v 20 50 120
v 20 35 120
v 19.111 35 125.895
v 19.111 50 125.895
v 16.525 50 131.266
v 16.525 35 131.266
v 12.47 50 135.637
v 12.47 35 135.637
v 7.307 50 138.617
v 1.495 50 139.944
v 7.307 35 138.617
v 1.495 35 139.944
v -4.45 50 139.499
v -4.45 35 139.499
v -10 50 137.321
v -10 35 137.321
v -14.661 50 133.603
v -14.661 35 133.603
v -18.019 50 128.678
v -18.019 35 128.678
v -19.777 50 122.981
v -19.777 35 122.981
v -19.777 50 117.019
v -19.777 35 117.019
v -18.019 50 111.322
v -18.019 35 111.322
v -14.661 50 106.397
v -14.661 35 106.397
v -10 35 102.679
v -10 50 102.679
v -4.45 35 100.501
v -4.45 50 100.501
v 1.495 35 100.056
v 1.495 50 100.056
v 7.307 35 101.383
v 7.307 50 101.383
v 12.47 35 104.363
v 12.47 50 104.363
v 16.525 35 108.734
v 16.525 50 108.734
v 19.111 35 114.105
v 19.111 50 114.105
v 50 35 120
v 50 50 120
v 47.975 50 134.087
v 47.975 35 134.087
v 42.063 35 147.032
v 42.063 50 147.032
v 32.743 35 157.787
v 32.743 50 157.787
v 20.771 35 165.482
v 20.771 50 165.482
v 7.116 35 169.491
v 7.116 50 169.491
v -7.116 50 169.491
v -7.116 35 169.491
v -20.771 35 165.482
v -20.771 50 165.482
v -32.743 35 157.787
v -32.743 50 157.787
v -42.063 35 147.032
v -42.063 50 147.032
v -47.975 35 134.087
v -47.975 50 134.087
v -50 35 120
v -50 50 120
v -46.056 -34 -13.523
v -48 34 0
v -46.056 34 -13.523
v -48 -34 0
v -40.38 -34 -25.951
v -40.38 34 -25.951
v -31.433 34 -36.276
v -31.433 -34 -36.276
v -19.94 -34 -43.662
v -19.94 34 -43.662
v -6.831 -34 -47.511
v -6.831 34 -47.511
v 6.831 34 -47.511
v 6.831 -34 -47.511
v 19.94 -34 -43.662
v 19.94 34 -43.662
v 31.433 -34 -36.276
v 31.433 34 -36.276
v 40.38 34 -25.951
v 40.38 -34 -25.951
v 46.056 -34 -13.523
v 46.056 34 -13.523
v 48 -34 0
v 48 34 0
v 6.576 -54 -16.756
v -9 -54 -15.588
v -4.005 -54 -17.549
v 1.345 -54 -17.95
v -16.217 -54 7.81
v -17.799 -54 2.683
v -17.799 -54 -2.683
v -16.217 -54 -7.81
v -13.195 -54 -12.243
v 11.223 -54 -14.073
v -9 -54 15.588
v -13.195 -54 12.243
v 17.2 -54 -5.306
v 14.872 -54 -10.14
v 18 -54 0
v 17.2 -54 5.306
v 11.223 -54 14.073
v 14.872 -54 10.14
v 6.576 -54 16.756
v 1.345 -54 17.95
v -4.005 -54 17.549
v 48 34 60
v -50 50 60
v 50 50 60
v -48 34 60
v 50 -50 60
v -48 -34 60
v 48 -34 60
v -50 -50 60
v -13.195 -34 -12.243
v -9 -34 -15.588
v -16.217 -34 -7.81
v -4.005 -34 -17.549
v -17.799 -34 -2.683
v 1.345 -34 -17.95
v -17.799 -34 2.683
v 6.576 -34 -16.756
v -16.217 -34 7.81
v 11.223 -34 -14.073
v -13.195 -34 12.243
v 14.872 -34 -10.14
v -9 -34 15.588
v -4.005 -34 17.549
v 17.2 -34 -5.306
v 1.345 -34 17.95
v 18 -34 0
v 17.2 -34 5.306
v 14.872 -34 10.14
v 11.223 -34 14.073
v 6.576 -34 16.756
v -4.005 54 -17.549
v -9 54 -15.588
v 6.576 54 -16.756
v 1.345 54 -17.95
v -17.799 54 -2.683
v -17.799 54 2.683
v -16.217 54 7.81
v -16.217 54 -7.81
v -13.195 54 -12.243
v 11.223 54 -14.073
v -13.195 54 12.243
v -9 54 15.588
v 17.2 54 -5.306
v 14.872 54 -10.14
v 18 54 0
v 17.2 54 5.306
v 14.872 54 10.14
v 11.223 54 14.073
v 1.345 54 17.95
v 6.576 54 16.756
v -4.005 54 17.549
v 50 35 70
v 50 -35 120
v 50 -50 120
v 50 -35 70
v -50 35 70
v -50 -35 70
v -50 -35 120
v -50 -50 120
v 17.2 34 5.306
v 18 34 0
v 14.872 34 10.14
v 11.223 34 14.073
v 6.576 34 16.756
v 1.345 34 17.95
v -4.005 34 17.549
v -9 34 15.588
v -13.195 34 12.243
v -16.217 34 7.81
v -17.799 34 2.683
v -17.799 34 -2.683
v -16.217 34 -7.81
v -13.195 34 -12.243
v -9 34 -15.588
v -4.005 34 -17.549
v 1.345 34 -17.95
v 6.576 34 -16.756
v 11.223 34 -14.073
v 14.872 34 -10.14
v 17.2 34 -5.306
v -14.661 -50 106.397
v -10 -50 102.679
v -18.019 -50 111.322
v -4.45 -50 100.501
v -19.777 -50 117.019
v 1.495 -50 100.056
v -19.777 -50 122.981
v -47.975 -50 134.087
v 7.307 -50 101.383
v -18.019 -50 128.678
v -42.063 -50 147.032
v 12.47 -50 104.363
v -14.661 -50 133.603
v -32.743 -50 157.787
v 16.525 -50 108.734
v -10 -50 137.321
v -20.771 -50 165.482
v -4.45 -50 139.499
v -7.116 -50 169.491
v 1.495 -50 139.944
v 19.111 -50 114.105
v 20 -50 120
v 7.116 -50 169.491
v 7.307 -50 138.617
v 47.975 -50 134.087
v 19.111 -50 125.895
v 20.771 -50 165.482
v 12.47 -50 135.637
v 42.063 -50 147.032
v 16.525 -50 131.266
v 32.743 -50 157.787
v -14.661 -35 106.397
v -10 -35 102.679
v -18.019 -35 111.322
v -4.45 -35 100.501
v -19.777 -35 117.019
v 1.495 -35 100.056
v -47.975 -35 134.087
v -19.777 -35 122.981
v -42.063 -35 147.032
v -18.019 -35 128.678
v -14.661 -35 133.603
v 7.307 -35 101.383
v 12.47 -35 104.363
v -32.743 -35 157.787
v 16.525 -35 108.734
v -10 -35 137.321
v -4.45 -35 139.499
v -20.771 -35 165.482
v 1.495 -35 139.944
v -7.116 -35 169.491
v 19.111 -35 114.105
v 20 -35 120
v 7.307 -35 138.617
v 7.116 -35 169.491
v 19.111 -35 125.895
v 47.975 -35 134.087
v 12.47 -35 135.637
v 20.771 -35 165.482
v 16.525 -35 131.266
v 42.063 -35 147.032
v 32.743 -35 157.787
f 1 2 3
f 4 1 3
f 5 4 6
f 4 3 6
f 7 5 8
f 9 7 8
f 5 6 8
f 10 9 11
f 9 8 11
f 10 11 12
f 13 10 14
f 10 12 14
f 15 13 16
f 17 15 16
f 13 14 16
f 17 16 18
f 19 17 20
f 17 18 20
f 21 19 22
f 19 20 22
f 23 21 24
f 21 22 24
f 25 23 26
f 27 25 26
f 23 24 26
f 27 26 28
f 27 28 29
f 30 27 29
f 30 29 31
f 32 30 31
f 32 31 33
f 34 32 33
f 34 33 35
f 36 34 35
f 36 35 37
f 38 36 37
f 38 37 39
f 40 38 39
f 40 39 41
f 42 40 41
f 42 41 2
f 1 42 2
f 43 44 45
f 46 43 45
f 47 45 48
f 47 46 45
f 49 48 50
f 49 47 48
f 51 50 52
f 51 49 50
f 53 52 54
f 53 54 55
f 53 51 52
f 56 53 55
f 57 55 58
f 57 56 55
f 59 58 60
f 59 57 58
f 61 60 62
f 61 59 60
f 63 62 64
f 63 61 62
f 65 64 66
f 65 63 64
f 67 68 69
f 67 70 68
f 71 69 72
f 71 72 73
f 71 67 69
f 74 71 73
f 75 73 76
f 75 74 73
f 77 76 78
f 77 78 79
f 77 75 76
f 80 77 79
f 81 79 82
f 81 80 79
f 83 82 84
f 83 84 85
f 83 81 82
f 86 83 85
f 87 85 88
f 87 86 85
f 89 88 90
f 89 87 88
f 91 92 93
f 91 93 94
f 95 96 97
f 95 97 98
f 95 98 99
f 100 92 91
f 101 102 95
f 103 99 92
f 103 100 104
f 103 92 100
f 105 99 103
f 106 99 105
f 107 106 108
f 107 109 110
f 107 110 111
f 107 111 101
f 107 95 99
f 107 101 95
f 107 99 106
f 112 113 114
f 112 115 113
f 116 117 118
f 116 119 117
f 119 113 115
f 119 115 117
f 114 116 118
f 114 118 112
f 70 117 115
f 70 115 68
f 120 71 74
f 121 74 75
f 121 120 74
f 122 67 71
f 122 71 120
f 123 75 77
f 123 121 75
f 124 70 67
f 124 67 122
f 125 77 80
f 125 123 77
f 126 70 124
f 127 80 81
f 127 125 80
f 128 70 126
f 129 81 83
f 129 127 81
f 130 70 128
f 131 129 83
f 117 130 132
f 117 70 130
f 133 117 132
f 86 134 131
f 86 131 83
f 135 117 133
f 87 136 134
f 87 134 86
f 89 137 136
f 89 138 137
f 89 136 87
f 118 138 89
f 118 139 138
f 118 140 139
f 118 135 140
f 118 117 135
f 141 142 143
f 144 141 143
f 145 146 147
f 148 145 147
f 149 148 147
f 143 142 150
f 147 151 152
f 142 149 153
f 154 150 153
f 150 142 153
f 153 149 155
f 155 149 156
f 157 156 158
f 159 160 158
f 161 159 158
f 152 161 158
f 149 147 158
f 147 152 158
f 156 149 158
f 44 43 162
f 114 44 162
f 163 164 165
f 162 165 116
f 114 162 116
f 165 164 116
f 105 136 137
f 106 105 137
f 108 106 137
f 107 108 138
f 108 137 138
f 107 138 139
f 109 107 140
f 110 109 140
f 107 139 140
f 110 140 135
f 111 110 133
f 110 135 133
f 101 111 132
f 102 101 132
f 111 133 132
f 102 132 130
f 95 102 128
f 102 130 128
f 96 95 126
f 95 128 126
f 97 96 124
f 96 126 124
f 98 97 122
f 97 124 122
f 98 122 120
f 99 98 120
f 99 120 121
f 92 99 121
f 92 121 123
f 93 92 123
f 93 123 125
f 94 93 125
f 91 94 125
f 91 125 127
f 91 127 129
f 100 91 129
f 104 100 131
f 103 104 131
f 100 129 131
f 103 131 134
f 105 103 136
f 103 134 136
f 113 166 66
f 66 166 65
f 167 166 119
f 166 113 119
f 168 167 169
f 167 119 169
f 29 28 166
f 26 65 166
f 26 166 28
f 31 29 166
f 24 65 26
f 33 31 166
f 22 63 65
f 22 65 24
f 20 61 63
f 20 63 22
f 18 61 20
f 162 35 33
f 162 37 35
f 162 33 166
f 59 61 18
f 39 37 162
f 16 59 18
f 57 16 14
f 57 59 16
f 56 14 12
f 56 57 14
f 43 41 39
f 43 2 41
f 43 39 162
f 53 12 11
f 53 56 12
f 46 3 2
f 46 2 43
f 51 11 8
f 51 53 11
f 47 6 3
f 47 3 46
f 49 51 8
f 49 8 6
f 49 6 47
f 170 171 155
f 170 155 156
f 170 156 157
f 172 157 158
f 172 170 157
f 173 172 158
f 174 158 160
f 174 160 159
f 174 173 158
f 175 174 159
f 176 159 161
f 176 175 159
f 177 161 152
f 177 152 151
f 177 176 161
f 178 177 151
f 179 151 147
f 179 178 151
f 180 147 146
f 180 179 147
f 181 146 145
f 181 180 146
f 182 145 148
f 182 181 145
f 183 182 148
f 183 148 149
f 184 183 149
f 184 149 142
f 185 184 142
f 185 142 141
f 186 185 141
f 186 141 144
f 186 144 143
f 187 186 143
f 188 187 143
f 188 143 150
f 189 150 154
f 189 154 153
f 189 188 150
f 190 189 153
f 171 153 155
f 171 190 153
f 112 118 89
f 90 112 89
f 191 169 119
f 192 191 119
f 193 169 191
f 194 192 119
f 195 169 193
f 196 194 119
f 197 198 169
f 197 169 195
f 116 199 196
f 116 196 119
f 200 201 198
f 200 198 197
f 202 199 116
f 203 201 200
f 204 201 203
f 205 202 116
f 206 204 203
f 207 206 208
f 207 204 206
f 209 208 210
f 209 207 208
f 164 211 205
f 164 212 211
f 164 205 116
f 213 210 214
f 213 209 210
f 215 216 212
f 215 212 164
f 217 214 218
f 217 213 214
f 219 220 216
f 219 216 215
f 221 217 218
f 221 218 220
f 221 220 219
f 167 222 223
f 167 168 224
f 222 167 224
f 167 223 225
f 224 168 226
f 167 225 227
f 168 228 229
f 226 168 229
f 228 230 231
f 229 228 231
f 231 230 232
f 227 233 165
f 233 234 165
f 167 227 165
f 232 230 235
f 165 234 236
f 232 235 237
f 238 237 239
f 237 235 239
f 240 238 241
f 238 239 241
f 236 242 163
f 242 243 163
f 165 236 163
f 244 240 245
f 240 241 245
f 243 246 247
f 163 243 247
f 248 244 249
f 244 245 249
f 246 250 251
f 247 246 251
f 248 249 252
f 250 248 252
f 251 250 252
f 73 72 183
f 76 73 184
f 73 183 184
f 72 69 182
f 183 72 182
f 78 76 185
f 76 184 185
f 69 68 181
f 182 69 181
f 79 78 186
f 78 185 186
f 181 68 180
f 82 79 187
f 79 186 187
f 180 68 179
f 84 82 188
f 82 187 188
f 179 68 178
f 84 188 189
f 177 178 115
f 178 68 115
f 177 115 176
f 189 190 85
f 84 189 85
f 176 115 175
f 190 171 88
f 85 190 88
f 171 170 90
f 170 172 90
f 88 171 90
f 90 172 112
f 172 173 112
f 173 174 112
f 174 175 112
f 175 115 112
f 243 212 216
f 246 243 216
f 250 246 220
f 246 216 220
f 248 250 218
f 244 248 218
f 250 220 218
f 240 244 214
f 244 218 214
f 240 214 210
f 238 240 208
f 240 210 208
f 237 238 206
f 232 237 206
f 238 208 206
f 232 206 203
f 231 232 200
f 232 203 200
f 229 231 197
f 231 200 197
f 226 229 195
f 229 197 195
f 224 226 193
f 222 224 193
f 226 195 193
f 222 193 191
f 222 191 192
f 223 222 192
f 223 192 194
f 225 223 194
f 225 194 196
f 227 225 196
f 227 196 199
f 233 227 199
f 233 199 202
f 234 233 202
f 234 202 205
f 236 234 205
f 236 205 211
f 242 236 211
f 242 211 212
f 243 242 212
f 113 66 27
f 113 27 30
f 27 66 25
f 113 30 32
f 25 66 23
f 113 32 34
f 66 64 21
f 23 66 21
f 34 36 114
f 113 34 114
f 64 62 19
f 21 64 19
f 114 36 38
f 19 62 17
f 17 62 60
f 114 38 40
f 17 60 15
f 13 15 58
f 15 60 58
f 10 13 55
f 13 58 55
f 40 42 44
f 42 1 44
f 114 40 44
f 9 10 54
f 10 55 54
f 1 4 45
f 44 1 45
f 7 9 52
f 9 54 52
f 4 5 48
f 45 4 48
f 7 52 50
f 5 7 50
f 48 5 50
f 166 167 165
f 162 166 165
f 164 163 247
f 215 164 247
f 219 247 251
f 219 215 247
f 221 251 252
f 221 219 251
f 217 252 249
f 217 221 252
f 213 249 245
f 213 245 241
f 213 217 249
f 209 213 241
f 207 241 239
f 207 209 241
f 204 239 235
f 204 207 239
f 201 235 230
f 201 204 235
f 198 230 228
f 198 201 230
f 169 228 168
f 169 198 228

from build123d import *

# Parameters (mm, degrees)
PAD_DEPTH       = 34
SKETCH001_R     = 18
PAD001_DEPTH    = 20
SKETCH002_W     = 100
SKETCH002_H     = 100
PAD002_DEPTH    = 20
PAD003_DEPTH    = 50
SKETCH004_R     = 20
POCKET_DEPTH    = 100
SKETCH005_W     = 100
SKETCH005_H     = 101
POCKET001_DEPTH = 35
SKETCH006_W     = 100
SKETCH006_H     = 10
POCKET002_DEPTH = 16
SKETCH007_W     = 10
SKETCH007_H     = 68
POCKET003_DEPTH = 2


with BuildPart() as part:
    # Sketch → Pad (new body, symmetric)
    with BuildSketch(Plane.XZ):
        with BuildLine():
            ThreePointArc((-48, 0), (0, -48), (48, 0))
            Line((48, 50), (48, 0))
            Line((-48, 50), (48, 50))
            Line((-48, 0), (-48, 50))
        make_face()
    extrude(amount=PAD_DEPTH, both=True)

    # Sketch001 (on Face6 of Pad) → Pad001 (join)
    with BuildSketch(Plane.XZ.offset(34)):
        Circle(SKETCH001_R)
    pad001 = extrude(amount=PAD001_DEPTH)

    # Mirrored: Pad001 across XZ
    add(pad001.mirror(Plane.XZ))

    # Sketch002 (on Face6 of Mirrored) → Pad002 (join)
    with BuildSketch(Plane(origin=(0, 0, 50), x_dir=(-1, 0, 0), z_dir=(0, 0, 1))):
        Rectangle(SKETCH002_W, SKETCH002_H)
    extrude(amount=PAD002_DEPTH)

    # Sketch003 → Pad003 (join, symmetric)
    with BuildSketch(Plane.XZ):
        with BuildLine():
            ThreePointArc((50, 120), (0, 170), (-50, 120))
            Line((-50, 70), (-50, 120))
            Line((50, 70), (-50, 70))
            Line((50, 120), (50, 70))
        make_face()
    extrude(amount=PAD003_DEPTH, both=True)

    # Sketch004 (on Face5 of Pad003) → Pocket (cut)
    with BuildSketch(Plane.XZ.offset(50)):
        with Locations((0, 120)):
            Circle(SKETCH004_R)
    extrude(amount=-POCKET_DEPTH, mode=Mode.SUBTRACT)

    # Sketch005 → Pocket001 (cut, symmetric)
    with BuildSketch(Plane.XZ):
        with Locations((0, 120.5)):
            Rectangle(SKETCH005_W, SKETCH005_H)
    extrude(amount=POCKET001_DEPTH, both=True, mode=Mode.SUBTRACT)

    # Sketch006 (on Face1 of Pocket001) → Pocket002 (cut)
    with BuildSketch(Plane.XZ.offset(50)):
        with Locations((0, 55)):
            Rectangle(SKETCH006_W, SKETCH006_H)
    pocket002 = extrude(amount=-POCKET002_DEPTH, mode=Mode.SUBTRACT)

    # Mirrored001: Pocket002 across XZ
    add(pocket002.mirror(Plane.XZ), mode=Mode.SUBTRACT)

    # Sketch007 (on Face3 of Mirrored001) → Pocket003 (cut)
    with BuildSketch(Plane(origin=(-50, 0, 0), x_dir=(0, 0, -1), z_dir=(-1, 0, 0))):
        with Locations((-55, 0)):
            Rectangle(SKETCH007_W, SKETCH007_H)
    pocket003 = extrude(amount=-POCKET003_DEPTH, mode=Mode.SUBTRACT)

    # Mirrored002: Pocket003 across YZ
    add(pocket003.mirror(Plane.YZ), mode=Mode.SUBTRACT)


solid = part.part
